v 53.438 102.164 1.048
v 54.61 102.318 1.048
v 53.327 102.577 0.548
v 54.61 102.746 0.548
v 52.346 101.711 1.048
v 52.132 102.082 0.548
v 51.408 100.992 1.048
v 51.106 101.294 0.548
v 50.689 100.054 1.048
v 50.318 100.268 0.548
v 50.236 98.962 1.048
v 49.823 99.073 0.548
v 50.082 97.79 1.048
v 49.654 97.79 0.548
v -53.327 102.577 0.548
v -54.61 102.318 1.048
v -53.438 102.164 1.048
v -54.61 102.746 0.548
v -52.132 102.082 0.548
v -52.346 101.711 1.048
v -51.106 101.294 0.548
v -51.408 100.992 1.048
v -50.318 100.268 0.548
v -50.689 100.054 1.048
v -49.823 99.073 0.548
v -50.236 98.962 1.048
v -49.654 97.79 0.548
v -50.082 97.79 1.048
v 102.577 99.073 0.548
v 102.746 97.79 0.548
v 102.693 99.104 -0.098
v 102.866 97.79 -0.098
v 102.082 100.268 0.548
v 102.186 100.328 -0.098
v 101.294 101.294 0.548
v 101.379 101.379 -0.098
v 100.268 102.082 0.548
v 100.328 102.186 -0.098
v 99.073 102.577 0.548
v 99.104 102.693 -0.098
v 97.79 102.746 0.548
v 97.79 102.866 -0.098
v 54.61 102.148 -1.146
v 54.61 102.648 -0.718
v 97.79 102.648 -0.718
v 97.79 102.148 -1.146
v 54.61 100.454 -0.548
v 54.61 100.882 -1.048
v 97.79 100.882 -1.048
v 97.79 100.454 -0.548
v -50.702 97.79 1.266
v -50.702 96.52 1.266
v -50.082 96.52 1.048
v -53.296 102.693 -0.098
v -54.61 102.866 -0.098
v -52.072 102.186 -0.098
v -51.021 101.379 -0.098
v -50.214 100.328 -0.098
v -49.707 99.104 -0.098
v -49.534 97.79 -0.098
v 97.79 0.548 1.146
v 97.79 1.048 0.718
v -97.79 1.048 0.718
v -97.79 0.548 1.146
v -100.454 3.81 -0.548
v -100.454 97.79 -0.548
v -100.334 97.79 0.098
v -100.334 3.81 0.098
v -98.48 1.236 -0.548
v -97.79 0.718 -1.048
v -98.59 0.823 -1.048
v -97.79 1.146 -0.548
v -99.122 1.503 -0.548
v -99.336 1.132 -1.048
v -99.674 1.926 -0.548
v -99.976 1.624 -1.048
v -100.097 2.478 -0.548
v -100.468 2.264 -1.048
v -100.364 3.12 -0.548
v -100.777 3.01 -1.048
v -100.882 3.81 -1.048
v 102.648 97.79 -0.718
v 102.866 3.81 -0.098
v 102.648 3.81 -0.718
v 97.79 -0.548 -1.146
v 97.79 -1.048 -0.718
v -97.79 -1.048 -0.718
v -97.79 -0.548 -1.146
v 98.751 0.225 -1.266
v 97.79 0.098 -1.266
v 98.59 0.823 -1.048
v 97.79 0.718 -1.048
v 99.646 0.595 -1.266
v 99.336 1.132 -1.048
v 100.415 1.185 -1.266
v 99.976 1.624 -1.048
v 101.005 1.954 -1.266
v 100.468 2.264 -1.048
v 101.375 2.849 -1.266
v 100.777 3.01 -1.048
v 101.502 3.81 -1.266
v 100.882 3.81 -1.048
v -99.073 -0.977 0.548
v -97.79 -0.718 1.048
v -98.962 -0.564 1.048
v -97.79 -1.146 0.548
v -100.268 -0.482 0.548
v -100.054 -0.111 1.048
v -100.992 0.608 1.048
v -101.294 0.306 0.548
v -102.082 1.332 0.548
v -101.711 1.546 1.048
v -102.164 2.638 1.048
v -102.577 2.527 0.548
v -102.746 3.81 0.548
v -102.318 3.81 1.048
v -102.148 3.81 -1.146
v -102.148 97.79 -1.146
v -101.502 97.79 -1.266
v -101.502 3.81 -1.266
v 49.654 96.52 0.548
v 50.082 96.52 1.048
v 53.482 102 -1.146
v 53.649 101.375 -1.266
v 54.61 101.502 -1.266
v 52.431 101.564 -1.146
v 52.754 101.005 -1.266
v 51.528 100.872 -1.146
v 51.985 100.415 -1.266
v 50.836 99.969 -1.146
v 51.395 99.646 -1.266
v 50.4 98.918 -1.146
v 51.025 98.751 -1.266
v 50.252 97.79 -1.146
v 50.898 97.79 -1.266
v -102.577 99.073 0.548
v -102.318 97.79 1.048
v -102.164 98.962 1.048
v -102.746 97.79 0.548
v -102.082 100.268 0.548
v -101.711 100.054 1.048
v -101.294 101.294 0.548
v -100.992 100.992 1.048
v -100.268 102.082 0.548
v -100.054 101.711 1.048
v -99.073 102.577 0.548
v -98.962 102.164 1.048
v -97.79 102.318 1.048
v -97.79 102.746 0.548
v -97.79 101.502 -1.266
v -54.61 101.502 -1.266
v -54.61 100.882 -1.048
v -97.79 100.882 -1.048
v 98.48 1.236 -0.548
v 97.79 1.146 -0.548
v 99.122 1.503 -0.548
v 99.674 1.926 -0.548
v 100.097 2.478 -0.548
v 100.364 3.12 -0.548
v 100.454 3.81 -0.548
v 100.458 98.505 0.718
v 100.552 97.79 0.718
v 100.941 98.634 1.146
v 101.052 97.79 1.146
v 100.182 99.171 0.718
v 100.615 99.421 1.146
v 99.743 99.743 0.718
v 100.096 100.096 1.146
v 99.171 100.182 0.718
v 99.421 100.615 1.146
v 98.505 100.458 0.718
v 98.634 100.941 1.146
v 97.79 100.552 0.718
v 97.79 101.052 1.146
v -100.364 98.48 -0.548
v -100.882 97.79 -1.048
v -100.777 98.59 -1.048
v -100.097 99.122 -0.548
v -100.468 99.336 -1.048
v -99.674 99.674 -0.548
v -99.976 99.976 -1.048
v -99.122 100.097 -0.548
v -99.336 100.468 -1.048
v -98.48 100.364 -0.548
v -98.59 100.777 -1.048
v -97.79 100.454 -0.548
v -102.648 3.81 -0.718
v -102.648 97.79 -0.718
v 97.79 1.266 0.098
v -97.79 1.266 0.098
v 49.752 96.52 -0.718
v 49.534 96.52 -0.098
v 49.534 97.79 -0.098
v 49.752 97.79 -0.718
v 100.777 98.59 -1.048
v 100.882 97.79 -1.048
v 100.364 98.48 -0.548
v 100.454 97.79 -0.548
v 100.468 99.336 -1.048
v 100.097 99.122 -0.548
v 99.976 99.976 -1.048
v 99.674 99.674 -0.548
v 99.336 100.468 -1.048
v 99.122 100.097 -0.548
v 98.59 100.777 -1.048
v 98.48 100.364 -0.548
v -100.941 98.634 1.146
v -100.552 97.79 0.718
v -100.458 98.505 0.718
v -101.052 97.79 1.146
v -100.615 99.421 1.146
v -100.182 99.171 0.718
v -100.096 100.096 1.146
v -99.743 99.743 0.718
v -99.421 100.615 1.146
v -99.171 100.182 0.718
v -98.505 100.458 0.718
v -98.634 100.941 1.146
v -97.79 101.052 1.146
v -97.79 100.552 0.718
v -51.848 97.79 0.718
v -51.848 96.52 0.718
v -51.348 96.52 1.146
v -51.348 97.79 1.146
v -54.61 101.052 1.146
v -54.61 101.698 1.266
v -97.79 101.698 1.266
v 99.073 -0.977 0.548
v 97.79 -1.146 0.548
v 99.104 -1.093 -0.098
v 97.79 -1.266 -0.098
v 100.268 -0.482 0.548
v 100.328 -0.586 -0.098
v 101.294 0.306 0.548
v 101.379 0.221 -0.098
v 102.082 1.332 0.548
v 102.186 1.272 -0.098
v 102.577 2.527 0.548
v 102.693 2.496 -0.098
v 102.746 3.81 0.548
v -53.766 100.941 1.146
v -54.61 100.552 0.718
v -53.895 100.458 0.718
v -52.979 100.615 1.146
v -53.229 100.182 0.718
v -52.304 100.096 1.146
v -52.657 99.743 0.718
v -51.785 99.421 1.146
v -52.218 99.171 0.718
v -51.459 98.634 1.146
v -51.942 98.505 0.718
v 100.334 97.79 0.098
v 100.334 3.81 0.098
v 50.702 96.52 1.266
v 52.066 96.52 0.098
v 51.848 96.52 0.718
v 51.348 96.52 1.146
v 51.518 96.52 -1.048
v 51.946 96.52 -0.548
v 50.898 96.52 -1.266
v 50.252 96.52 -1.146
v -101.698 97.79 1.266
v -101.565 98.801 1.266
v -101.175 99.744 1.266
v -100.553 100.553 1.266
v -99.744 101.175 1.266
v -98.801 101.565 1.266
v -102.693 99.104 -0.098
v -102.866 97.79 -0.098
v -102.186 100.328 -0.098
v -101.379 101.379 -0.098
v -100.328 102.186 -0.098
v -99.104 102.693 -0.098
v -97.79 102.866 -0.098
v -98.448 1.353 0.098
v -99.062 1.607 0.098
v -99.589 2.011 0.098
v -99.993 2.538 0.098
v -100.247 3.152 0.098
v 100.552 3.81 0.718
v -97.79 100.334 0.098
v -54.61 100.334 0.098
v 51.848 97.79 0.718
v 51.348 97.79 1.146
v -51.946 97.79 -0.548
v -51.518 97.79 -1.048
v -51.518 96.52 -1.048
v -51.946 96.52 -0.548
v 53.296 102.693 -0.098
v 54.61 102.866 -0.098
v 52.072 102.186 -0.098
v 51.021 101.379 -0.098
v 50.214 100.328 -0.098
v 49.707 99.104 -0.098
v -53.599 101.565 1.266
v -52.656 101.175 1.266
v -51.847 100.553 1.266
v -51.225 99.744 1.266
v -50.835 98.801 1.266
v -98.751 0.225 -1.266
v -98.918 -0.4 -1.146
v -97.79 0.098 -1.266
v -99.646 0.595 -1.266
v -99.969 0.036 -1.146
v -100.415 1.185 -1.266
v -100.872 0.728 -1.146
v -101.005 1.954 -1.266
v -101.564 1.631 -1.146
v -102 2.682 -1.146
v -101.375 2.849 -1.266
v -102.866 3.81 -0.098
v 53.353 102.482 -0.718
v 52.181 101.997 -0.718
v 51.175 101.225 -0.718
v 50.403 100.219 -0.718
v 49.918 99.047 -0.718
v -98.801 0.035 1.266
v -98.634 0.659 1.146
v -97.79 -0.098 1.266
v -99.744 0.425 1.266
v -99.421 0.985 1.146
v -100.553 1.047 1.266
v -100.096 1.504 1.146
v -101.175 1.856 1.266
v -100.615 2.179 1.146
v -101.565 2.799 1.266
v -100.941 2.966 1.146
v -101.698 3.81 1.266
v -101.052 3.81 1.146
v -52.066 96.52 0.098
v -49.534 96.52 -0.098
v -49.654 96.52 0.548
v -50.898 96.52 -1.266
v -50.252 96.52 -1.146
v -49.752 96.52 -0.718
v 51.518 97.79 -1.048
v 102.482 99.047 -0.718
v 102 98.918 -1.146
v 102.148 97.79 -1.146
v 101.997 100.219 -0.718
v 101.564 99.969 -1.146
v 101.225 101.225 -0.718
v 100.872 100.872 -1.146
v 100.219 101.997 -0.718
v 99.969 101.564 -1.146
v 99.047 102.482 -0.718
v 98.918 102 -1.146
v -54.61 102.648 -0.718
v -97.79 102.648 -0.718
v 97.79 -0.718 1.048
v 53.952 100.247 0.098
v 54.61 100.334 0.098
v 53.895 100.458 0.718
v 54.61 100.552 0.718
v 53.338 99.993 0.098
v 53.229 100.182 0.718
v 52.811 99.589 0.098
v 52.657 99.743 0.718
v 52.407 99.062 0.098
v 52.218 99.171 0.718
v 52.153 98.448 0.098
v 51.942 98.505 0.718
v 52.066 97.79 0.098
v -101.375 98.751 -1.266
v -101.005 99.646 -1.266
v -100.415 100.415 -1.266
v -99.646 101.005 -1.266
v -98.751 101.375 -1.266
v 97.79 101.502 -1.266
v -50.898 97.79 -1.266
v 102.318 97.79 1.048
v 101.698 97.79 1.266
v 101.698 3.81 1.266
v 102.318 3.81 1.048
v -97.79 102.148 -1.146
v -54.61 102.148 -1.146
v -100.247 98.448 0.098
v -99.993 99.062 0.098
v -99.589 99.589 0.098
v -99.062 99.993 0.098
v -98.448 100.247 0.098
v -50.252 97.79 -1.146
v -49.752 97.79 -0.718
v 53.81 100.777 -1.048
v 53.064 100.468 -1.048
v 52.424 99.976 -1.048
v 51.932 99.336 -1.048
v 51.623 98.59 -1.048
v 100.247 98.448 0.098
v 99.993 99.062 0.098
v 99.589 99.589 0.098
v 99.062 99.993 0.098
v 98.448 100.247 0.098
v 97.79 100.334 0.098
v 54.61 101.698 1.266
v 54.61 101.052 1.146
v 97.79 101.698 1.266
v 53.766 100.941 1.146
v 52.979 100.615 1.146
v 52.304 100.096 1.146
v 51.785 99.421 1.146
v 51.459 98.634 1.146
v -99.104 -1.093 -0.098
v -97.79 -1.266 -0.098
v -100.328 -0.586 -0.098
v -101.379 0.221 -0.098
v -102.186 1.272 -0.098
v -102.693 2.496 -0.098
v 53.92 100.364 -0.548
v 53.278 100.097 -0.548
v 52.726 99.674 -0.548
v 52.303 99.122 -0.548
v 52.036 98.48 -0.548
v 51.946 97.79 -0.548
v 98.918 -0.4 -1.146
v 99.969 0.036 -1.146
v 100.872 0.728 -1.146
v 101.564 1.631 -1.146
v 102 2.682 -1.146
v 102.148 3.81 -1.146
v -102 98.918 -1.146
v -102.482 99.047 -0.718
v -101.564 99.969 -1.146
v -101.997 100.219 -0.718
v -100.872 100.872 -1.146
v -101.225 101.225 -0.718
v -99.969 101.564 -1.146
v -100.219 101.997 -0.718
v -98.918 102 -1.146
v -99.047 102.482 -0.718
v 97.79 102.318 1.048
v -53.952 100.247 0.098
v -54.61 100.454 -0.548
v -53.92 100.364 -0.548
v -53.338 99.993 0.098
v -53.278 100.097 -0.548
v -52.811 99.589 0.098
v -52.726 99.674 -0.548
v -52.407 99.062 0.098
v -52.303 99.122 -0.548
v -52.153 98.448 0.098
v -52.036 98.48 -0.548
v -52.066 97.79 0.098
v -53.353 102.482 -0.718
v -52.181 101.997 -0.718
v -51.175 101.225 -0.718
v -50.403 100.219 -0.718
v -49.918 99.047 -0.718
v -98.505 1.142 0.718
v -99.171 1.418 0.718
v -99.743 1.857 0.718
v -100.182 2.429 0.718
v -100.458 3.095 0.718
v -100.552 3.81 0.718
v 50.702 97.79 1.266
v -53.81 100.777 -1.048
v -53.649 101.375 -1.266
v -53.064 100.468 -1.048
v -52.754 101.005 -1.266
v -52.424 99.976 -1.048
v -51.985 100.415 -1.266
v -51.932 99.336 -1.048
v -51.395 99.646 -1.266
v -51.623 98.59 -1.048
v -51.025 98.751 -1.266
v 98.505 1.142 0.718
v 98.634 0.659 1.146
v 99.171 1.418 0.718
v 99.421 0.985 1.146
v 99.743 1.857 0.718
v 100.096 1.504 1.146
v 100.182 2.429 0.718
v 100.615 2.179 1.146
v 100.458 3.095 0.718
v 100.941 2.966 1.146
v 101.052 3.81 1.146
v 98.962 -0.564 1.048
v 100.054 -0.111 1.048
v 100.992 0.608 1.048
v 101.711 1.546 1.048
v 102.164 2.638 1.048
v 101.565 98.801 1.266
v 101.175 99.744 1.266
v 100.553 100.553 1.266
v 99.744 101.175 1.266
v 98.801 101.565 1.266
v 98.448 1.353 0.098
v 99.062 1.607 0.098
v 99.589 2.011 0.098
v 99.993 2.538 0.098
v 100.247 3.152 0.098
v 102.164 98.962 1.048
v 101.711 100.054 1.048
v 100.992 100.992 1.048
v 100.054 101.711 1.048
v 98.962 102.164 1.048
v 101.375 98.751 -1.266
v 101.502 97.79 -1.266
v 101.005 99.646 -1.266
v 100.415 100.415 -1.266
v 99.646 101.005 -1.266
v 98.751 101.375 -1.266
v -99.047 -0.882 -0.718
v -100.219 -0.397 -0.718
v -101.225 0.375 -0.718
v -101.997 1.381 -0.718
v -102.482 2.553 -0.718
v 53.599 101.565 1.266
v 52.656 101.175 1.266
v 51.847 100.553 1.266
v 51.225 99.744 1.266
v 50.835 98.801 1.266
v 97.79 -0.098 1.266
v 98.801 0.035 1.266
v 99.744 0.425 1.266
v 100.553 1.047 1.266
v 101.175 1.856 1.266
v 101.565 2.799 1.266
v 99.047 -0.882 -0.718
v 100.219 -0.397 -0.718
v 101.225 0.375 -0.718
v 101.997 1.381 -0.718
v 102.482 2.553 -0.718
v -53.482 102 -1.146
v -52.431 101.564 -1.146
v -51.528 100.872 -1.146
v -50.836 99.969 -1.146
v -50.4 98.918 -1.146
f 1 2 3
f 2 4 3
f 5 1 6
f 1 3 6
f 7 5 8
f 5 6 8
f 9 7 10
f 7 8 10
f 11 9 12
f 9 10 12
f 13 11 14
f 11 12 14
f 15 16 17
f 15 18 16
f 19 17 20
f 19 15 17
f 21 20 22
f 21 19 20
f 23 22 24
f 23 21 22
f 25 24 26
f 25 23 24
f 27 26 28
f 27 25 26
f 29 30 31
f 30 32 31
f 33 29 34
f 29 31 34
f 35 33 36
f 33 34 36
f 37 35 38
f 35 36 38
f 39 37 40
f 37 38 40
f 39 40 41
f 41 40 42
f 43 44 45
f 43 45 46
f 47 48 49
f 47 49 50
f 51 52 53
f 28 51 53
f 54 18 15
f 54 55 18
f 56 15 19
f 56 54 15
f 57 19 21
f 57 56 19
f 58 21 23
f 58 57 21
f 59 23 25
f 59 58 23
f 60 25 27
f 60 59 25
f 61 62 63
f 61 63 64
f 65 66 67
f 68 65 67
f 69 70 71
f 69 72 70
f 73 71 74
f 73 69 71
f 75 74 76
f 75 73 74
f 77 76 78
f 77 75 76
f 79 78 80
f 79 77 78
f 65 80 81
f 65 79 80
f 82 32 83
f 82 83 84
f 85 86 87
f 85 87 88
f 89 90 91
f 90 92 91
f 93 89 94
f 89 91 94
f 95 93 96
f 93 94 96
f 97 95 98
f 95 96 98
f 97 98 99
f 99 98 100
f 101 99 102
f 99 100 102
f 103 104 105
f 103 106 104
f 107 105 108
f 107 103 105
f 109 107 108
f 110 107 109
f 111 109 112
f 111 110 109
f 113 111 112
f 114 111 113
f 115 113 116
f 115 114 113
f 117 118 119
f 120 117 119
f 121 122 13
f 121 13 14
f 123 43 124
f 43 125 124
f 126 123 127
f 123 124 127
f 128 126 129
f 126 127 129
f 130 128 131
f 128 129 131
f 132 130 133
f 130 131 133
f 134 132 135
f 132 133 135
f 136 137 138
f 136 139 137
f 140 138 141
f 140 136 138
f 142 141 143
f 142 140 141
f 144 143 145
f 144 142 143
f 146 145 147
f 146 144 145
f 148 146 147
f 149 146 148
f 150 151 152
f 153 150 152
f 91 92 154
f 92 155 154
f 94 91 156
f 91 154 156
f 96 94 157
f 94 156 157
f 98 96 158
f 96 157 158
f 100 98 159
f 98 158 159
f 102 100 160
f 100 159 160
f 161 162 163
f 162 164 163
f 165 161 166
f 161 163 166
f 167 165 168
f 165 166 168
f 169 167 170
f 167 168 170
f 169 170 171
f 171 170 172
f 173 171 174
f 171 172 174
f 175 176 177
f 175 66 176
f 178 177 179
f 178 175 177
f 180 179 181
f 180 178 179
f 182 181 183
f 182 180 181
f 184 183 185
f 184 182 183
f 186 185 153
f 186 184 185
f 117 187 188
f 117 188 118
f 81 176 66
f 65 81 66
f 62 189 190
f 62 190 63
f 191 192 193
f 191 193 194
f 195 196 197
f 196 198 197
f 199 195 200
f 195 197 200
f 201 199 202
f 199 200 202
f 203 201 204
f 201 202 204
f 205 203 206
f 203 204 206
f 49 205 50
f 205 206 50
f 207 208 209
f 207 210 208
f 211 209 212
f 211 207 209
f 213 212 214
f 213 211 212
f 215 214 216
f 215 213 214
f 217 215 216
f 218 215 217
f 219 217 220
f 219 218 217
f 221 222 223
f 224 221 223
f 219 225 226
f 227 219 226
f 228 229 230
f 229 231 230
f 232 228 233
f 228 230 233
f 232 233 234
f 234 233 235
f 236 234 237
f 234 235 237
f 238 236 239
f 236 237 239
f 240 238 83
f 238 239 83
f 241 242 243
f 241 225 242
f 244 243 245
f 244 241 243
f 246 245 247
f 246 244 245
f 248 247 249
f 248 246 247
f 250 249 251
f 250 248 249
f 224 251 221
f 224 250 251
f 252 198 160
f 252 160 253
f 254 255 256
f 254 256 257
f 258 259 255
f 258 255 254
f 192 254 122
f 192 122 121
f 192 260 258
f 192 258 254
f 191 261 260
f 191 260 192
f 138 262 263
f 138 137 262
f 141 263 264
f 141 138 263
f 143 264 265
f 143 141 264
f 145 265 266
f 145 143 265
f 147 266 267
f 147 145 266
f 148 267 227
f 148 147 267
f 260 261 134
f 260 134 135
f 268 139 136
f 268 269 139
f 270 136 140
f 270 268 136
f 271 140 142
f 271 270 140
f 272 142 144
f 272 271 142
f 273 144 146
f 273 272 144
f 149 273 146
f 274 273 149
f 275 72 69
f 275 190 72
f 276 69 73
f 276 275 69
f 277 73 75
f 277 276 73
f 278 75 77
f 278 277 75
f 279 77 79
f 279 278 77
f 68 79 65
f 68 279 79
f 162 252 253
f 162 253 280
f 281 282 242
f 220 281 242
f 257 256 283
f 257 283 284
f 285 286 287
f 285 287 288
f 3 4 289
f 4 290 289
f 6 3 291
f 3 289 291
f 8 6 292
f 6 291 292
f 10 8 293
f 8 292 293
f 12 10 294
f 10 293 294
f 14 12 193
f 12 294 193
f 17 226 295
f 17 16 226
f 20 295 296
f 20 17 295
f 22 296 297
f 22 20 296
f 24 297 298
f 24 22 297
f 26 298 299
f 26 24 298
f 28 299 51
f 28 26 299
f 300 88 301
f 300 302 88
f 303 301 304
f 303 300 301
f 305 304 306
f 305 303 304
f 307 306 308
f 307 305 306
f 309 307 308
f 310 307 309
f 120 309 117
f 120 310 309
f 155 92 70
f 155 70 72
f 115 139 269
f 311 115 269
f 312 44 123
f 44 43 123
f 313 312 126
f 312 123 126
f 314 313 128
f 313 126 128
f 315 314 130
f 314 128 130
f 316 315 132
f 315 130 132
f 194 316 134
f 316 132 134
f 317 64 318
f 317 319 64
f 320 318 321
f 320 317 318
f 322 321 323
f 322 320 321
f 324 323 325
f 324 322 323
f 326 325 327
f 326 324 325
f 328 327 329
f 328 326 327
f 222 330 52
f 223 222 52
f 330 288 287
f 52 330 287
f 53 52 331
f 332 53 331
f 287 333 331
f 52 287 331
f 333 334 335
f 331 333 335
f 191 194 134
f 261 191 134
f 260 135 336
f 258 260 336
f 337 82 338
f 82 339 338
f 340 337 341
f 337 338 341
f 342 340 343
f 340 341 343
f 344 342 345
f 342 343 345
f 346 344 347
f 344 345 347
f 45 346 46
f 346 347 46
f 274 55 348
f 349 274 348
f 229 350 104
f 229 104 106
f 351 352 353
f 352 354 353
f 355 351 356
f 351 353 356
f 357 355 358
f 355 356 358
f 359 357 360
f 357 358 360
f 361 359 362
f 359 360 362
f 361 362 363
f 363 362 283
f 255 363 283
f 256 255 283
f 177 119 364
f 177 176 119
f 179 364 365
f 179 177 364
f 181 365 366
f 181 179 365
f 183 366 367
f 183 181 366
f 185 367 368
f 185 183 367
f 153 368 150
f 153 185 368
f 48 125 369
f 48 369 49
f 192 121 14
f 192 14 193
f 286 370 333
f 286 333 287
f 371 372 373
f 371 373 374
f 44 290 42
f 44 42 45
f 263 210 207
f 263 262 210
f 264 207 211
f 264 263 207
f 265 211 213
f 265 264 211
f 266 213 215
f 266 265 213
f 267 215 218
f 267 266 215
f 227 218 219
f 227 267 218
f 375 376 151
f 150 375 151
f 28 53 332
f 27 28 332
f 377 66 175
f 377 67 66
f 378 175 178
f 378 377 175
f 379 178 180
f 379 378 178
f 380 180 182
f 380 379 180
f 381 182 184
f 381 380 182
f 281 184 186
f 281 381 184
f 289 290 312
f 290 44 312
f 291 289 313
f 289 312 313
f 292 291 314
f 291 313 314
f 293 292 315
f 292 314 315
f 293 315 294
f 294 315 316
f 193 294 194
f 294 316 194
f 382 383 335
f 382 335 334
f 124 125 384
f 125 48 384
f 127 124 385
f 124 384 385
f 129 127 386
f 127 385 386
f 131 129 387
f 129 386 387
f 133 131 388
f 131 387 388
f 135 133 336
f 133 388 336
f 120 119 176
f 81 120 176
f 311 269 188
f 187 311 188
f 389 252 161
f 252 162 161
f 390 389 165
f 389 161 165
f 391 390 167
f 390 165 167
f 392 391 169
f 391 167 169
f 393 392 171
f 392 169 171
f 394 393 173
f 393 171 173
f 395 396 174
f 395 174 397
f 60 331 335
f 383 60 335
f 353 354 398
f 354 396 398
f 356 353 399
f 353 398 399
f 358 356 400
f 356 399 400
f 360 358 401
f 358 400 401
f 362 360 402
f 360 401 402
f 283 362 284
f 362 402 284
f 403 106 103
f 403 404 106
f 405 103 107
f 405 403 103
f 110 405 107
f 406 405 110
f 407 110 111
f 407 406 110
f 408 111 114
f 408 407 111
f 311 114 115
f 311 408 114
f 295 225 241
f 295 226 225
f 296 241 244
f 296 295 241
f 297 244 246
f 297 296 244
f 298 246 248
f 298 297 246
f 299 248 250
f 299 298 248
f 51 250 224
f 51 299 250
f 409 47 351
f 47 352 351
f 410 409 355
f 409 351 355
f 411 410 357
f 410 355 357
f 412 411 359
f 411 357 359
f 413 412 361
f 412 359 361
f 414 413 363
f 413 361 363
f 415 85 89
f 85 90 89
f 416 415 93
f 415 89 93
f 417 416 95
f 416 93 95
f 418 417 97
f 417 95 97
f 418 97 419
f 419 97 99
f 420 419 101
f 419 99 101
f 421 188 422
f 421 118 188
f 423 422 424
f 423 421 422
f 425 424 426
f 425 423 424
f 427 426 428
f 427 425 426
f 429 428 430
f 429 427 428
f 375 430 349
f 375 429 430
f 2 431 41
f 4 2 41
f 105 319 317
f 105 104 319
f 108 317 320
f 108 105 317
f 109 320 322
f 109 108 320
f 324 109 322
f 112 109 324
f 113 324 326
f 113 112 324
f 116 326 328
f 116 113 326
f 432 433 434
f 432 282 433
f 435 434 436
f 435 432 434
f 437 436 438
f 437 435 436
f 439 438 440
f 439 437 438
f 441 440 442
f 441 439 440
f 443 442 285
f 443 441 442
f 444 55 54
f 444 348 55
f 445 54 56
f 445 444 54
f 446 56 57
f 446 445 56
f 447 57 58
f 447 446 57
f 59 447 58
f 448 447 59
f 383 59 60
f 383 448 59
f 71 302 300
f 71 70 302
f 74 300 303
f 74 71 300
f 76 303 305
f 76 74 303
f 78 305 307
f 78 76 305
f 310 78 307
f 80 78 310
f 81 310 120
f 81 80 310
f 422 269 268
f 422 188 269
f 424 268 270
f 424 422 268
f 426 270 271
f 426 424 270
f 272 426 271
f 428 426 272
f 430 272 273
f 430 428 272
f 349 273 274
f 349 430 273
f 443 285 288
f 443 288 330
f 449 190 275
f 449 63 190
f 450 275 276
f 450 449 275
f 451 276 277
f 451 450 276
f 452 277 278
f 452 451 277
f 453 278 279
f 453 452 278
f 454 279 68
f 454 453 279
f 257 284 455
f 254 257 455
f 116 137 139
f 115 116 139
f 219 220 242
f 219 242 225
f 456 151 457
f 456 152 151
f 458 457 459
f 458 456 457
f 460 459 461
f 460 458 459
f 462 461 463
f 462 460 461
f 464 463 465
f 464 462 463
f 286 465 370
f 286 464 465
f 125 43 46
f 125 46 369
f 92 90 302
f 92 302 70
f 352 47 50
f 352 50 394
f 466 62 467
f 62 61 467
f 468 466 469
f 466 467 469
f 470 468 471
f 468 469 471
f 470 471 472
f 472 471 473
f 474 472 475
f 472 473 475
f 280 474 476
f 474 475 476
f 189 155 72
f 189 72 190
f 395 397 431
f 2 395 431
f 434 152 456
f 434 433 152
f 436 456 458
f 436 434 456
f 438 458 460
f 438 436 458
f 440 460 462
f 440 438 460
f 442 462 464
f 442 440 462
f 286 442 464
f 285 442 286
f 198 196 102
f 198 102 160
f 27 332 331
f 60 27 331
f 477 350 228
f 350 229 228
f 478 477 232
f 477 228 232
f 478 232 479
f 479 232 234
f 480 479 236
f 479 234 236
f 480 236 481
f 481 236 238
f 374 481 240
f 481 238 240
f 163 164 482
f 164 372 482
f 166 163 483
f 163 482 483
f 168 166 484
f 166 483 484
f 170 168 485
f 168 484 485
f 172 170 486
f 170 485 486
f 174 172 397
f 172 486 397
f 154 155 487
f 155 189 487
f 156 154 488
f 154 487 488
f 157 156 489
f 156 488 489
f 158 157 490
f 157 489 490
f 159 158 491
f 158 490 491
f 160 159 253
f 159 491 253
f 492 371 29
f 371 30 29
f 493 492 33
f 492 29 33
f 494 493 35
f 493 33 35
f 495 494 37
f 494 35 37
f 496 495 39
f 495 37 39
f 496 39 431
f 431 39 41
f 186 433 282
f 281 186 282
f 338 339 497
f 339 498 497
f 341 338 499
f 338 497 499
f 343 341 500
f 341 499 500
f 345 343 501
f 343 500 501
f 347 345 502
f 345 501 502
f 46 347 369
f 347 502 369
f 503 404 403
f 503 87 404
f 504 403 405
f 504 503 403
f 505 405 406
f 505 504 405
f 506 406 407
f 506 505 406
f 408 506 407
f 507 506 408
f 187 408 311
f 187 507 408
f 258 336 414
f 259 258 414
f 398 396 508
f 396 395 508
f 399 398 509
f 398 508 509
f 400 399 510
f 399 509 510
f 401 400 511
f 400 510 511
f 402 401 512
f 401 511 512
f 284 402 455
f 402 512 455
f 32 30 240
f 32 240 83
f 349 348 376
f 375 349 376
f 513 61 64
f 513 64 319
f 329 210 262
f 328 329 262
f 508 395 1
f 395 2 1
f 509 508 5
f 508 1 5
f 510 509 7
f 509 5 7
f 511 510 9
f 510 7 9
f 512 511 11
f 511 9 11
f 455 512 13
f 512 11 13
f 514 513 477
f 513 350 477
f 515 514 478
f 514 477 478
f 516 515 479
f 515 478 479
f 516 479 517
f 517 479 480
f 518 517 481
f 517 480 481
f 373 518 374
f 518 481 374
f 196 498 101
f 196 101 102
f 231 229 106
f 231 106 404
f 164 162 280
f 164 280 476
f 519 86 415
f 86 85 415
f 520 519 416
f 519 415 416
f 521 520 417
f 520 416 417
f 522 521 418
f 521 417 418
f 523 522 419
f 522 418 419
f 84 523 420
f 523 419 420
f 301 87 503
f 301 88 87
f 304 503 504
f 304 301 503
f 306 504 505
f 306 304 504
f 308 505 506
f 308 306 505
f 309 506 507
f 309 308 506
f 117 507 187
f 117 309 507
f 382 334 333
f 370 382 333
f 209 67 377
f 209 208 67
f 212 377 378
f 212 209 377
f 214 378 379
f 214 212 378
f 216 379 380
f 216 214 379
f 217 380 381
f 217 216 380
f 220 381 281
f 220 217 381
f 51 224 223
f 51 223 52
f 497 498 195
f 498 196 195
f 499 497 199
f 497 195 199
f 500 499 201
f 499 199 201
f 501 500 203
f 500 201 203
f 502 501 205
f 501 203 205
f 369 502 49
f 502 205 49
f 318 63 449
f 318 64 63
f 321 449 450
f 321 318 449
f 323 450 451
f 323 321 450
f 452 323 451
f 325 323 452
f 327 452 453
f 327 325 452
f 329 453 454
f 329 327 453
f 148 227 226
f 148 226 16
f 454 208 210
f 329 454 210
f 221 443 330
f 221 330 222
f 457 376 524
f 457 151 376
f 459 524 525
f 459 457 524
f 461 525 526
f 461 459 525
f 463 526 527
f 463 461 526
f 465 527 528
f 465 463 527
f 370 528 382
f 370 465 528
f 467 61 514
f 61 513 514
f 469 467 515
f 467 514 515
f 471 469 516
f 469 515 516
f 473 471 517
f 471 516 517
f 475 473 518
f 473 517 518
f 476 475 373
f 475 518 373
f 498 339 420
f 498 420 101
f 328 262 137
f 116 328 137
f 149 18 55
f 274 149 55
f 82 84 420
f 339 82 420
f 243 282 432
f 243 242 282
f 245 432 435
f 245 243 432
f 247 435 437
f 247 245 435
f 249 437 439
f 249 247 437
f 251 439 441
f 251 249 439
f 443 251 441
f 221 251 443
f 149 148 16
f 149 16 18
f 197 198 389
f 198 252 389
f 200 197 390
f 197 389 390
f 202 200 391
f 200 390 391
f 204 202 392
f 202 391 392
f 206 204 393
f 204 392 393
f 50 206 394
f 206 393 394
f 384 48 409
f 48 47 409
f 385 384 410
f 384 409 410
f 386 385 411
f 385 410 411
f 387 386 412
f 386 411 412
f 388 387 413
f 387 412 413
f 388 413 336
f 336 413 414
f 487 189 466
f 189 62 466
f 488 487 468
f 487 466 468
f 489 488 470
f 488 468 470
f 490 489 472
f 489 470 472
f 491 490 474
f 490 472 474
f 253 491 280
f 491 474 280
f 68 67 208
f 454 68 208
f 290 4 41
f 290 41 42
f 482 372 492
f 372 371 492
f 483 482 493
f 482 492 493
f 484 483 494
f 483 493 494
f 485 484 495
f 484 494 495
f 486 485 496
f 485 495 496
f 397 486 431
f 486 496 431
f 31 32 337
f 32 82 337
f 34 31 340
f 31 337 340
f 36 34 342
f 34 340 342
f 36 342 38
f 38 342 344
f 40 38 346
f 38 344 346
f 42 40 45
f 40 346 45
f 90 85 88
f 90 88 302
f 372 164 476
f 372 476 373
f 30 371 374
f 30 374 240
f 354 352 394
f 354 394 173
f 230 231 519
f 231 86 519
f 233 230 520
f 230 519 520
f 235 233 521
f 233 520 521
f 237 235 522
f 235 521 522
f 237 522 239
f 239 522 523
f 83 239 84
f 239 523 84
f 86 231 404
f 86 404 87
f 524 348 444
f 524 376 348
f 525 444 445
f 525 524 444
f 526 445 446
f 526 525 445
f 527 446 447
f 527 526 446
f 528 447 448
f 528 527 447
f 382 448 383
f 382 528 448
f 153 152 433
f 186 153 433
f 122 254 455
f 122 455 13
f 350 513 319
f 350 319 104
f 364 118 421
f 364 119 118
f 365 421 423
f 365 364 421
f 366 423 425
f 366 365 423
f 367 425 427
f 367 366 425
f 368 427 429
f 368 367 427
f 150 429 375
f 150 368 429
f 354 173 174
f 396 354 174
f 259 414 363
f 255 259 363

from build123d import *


with BuildPart() as f2:
    # F2: sweep along a path in F0
    with BuildLine(Plane.XY) as f2_path:
        Line((0, 0), (-97.79, 0))
        ThreePointArc((-97.79, 0), (-100.4840768363, 1.1159231637), (-101.6, 3.81))
        Line((-101.6, 3.81), (-101.6, 97.79))
        ThreePointArc((-101.6, 97.79), (-100.4840768363, 100.4840768363), (-97.79, 101.6))
        Line((-97.79, 101.6), (-54.61, 101.6))
        ThreePointArc((-54.61, 101.6), (-51.9159231637, 100.4840768363), (-50.8, 97.79))
        Line((-50.8, 97.79), (-50.8, 96.52))
    # F1 (on Right) → F2 (sweep)
    with BuildSketch(Plane.YZ):
        Polygon((0.7180774052, -1.0475041003), (1.145625325, -0.5481264588), (1.266203864, 0.0981212247), (1.0475041003, 0.7180774052), (0.5481264588, 1.145625325), (-0.0981212247, 1.266203864), (-0.7180774052, 1.0475041003), (-1.145625325, 0.5481264588), (-1.266203864, -0.0981212247), (-1.0475041003, -0.7180774052), (-0.5481264588, -1.145625325), (0.0981212247, -1.266203864), align=None)
    sweep(path=f2_path.line)

    # F3: F2 across plane


with BuildPart() as f2_1:
    add(f2.part)
    add(f2.part.mirror(Plane.YZ))


solid = f2_1.part
